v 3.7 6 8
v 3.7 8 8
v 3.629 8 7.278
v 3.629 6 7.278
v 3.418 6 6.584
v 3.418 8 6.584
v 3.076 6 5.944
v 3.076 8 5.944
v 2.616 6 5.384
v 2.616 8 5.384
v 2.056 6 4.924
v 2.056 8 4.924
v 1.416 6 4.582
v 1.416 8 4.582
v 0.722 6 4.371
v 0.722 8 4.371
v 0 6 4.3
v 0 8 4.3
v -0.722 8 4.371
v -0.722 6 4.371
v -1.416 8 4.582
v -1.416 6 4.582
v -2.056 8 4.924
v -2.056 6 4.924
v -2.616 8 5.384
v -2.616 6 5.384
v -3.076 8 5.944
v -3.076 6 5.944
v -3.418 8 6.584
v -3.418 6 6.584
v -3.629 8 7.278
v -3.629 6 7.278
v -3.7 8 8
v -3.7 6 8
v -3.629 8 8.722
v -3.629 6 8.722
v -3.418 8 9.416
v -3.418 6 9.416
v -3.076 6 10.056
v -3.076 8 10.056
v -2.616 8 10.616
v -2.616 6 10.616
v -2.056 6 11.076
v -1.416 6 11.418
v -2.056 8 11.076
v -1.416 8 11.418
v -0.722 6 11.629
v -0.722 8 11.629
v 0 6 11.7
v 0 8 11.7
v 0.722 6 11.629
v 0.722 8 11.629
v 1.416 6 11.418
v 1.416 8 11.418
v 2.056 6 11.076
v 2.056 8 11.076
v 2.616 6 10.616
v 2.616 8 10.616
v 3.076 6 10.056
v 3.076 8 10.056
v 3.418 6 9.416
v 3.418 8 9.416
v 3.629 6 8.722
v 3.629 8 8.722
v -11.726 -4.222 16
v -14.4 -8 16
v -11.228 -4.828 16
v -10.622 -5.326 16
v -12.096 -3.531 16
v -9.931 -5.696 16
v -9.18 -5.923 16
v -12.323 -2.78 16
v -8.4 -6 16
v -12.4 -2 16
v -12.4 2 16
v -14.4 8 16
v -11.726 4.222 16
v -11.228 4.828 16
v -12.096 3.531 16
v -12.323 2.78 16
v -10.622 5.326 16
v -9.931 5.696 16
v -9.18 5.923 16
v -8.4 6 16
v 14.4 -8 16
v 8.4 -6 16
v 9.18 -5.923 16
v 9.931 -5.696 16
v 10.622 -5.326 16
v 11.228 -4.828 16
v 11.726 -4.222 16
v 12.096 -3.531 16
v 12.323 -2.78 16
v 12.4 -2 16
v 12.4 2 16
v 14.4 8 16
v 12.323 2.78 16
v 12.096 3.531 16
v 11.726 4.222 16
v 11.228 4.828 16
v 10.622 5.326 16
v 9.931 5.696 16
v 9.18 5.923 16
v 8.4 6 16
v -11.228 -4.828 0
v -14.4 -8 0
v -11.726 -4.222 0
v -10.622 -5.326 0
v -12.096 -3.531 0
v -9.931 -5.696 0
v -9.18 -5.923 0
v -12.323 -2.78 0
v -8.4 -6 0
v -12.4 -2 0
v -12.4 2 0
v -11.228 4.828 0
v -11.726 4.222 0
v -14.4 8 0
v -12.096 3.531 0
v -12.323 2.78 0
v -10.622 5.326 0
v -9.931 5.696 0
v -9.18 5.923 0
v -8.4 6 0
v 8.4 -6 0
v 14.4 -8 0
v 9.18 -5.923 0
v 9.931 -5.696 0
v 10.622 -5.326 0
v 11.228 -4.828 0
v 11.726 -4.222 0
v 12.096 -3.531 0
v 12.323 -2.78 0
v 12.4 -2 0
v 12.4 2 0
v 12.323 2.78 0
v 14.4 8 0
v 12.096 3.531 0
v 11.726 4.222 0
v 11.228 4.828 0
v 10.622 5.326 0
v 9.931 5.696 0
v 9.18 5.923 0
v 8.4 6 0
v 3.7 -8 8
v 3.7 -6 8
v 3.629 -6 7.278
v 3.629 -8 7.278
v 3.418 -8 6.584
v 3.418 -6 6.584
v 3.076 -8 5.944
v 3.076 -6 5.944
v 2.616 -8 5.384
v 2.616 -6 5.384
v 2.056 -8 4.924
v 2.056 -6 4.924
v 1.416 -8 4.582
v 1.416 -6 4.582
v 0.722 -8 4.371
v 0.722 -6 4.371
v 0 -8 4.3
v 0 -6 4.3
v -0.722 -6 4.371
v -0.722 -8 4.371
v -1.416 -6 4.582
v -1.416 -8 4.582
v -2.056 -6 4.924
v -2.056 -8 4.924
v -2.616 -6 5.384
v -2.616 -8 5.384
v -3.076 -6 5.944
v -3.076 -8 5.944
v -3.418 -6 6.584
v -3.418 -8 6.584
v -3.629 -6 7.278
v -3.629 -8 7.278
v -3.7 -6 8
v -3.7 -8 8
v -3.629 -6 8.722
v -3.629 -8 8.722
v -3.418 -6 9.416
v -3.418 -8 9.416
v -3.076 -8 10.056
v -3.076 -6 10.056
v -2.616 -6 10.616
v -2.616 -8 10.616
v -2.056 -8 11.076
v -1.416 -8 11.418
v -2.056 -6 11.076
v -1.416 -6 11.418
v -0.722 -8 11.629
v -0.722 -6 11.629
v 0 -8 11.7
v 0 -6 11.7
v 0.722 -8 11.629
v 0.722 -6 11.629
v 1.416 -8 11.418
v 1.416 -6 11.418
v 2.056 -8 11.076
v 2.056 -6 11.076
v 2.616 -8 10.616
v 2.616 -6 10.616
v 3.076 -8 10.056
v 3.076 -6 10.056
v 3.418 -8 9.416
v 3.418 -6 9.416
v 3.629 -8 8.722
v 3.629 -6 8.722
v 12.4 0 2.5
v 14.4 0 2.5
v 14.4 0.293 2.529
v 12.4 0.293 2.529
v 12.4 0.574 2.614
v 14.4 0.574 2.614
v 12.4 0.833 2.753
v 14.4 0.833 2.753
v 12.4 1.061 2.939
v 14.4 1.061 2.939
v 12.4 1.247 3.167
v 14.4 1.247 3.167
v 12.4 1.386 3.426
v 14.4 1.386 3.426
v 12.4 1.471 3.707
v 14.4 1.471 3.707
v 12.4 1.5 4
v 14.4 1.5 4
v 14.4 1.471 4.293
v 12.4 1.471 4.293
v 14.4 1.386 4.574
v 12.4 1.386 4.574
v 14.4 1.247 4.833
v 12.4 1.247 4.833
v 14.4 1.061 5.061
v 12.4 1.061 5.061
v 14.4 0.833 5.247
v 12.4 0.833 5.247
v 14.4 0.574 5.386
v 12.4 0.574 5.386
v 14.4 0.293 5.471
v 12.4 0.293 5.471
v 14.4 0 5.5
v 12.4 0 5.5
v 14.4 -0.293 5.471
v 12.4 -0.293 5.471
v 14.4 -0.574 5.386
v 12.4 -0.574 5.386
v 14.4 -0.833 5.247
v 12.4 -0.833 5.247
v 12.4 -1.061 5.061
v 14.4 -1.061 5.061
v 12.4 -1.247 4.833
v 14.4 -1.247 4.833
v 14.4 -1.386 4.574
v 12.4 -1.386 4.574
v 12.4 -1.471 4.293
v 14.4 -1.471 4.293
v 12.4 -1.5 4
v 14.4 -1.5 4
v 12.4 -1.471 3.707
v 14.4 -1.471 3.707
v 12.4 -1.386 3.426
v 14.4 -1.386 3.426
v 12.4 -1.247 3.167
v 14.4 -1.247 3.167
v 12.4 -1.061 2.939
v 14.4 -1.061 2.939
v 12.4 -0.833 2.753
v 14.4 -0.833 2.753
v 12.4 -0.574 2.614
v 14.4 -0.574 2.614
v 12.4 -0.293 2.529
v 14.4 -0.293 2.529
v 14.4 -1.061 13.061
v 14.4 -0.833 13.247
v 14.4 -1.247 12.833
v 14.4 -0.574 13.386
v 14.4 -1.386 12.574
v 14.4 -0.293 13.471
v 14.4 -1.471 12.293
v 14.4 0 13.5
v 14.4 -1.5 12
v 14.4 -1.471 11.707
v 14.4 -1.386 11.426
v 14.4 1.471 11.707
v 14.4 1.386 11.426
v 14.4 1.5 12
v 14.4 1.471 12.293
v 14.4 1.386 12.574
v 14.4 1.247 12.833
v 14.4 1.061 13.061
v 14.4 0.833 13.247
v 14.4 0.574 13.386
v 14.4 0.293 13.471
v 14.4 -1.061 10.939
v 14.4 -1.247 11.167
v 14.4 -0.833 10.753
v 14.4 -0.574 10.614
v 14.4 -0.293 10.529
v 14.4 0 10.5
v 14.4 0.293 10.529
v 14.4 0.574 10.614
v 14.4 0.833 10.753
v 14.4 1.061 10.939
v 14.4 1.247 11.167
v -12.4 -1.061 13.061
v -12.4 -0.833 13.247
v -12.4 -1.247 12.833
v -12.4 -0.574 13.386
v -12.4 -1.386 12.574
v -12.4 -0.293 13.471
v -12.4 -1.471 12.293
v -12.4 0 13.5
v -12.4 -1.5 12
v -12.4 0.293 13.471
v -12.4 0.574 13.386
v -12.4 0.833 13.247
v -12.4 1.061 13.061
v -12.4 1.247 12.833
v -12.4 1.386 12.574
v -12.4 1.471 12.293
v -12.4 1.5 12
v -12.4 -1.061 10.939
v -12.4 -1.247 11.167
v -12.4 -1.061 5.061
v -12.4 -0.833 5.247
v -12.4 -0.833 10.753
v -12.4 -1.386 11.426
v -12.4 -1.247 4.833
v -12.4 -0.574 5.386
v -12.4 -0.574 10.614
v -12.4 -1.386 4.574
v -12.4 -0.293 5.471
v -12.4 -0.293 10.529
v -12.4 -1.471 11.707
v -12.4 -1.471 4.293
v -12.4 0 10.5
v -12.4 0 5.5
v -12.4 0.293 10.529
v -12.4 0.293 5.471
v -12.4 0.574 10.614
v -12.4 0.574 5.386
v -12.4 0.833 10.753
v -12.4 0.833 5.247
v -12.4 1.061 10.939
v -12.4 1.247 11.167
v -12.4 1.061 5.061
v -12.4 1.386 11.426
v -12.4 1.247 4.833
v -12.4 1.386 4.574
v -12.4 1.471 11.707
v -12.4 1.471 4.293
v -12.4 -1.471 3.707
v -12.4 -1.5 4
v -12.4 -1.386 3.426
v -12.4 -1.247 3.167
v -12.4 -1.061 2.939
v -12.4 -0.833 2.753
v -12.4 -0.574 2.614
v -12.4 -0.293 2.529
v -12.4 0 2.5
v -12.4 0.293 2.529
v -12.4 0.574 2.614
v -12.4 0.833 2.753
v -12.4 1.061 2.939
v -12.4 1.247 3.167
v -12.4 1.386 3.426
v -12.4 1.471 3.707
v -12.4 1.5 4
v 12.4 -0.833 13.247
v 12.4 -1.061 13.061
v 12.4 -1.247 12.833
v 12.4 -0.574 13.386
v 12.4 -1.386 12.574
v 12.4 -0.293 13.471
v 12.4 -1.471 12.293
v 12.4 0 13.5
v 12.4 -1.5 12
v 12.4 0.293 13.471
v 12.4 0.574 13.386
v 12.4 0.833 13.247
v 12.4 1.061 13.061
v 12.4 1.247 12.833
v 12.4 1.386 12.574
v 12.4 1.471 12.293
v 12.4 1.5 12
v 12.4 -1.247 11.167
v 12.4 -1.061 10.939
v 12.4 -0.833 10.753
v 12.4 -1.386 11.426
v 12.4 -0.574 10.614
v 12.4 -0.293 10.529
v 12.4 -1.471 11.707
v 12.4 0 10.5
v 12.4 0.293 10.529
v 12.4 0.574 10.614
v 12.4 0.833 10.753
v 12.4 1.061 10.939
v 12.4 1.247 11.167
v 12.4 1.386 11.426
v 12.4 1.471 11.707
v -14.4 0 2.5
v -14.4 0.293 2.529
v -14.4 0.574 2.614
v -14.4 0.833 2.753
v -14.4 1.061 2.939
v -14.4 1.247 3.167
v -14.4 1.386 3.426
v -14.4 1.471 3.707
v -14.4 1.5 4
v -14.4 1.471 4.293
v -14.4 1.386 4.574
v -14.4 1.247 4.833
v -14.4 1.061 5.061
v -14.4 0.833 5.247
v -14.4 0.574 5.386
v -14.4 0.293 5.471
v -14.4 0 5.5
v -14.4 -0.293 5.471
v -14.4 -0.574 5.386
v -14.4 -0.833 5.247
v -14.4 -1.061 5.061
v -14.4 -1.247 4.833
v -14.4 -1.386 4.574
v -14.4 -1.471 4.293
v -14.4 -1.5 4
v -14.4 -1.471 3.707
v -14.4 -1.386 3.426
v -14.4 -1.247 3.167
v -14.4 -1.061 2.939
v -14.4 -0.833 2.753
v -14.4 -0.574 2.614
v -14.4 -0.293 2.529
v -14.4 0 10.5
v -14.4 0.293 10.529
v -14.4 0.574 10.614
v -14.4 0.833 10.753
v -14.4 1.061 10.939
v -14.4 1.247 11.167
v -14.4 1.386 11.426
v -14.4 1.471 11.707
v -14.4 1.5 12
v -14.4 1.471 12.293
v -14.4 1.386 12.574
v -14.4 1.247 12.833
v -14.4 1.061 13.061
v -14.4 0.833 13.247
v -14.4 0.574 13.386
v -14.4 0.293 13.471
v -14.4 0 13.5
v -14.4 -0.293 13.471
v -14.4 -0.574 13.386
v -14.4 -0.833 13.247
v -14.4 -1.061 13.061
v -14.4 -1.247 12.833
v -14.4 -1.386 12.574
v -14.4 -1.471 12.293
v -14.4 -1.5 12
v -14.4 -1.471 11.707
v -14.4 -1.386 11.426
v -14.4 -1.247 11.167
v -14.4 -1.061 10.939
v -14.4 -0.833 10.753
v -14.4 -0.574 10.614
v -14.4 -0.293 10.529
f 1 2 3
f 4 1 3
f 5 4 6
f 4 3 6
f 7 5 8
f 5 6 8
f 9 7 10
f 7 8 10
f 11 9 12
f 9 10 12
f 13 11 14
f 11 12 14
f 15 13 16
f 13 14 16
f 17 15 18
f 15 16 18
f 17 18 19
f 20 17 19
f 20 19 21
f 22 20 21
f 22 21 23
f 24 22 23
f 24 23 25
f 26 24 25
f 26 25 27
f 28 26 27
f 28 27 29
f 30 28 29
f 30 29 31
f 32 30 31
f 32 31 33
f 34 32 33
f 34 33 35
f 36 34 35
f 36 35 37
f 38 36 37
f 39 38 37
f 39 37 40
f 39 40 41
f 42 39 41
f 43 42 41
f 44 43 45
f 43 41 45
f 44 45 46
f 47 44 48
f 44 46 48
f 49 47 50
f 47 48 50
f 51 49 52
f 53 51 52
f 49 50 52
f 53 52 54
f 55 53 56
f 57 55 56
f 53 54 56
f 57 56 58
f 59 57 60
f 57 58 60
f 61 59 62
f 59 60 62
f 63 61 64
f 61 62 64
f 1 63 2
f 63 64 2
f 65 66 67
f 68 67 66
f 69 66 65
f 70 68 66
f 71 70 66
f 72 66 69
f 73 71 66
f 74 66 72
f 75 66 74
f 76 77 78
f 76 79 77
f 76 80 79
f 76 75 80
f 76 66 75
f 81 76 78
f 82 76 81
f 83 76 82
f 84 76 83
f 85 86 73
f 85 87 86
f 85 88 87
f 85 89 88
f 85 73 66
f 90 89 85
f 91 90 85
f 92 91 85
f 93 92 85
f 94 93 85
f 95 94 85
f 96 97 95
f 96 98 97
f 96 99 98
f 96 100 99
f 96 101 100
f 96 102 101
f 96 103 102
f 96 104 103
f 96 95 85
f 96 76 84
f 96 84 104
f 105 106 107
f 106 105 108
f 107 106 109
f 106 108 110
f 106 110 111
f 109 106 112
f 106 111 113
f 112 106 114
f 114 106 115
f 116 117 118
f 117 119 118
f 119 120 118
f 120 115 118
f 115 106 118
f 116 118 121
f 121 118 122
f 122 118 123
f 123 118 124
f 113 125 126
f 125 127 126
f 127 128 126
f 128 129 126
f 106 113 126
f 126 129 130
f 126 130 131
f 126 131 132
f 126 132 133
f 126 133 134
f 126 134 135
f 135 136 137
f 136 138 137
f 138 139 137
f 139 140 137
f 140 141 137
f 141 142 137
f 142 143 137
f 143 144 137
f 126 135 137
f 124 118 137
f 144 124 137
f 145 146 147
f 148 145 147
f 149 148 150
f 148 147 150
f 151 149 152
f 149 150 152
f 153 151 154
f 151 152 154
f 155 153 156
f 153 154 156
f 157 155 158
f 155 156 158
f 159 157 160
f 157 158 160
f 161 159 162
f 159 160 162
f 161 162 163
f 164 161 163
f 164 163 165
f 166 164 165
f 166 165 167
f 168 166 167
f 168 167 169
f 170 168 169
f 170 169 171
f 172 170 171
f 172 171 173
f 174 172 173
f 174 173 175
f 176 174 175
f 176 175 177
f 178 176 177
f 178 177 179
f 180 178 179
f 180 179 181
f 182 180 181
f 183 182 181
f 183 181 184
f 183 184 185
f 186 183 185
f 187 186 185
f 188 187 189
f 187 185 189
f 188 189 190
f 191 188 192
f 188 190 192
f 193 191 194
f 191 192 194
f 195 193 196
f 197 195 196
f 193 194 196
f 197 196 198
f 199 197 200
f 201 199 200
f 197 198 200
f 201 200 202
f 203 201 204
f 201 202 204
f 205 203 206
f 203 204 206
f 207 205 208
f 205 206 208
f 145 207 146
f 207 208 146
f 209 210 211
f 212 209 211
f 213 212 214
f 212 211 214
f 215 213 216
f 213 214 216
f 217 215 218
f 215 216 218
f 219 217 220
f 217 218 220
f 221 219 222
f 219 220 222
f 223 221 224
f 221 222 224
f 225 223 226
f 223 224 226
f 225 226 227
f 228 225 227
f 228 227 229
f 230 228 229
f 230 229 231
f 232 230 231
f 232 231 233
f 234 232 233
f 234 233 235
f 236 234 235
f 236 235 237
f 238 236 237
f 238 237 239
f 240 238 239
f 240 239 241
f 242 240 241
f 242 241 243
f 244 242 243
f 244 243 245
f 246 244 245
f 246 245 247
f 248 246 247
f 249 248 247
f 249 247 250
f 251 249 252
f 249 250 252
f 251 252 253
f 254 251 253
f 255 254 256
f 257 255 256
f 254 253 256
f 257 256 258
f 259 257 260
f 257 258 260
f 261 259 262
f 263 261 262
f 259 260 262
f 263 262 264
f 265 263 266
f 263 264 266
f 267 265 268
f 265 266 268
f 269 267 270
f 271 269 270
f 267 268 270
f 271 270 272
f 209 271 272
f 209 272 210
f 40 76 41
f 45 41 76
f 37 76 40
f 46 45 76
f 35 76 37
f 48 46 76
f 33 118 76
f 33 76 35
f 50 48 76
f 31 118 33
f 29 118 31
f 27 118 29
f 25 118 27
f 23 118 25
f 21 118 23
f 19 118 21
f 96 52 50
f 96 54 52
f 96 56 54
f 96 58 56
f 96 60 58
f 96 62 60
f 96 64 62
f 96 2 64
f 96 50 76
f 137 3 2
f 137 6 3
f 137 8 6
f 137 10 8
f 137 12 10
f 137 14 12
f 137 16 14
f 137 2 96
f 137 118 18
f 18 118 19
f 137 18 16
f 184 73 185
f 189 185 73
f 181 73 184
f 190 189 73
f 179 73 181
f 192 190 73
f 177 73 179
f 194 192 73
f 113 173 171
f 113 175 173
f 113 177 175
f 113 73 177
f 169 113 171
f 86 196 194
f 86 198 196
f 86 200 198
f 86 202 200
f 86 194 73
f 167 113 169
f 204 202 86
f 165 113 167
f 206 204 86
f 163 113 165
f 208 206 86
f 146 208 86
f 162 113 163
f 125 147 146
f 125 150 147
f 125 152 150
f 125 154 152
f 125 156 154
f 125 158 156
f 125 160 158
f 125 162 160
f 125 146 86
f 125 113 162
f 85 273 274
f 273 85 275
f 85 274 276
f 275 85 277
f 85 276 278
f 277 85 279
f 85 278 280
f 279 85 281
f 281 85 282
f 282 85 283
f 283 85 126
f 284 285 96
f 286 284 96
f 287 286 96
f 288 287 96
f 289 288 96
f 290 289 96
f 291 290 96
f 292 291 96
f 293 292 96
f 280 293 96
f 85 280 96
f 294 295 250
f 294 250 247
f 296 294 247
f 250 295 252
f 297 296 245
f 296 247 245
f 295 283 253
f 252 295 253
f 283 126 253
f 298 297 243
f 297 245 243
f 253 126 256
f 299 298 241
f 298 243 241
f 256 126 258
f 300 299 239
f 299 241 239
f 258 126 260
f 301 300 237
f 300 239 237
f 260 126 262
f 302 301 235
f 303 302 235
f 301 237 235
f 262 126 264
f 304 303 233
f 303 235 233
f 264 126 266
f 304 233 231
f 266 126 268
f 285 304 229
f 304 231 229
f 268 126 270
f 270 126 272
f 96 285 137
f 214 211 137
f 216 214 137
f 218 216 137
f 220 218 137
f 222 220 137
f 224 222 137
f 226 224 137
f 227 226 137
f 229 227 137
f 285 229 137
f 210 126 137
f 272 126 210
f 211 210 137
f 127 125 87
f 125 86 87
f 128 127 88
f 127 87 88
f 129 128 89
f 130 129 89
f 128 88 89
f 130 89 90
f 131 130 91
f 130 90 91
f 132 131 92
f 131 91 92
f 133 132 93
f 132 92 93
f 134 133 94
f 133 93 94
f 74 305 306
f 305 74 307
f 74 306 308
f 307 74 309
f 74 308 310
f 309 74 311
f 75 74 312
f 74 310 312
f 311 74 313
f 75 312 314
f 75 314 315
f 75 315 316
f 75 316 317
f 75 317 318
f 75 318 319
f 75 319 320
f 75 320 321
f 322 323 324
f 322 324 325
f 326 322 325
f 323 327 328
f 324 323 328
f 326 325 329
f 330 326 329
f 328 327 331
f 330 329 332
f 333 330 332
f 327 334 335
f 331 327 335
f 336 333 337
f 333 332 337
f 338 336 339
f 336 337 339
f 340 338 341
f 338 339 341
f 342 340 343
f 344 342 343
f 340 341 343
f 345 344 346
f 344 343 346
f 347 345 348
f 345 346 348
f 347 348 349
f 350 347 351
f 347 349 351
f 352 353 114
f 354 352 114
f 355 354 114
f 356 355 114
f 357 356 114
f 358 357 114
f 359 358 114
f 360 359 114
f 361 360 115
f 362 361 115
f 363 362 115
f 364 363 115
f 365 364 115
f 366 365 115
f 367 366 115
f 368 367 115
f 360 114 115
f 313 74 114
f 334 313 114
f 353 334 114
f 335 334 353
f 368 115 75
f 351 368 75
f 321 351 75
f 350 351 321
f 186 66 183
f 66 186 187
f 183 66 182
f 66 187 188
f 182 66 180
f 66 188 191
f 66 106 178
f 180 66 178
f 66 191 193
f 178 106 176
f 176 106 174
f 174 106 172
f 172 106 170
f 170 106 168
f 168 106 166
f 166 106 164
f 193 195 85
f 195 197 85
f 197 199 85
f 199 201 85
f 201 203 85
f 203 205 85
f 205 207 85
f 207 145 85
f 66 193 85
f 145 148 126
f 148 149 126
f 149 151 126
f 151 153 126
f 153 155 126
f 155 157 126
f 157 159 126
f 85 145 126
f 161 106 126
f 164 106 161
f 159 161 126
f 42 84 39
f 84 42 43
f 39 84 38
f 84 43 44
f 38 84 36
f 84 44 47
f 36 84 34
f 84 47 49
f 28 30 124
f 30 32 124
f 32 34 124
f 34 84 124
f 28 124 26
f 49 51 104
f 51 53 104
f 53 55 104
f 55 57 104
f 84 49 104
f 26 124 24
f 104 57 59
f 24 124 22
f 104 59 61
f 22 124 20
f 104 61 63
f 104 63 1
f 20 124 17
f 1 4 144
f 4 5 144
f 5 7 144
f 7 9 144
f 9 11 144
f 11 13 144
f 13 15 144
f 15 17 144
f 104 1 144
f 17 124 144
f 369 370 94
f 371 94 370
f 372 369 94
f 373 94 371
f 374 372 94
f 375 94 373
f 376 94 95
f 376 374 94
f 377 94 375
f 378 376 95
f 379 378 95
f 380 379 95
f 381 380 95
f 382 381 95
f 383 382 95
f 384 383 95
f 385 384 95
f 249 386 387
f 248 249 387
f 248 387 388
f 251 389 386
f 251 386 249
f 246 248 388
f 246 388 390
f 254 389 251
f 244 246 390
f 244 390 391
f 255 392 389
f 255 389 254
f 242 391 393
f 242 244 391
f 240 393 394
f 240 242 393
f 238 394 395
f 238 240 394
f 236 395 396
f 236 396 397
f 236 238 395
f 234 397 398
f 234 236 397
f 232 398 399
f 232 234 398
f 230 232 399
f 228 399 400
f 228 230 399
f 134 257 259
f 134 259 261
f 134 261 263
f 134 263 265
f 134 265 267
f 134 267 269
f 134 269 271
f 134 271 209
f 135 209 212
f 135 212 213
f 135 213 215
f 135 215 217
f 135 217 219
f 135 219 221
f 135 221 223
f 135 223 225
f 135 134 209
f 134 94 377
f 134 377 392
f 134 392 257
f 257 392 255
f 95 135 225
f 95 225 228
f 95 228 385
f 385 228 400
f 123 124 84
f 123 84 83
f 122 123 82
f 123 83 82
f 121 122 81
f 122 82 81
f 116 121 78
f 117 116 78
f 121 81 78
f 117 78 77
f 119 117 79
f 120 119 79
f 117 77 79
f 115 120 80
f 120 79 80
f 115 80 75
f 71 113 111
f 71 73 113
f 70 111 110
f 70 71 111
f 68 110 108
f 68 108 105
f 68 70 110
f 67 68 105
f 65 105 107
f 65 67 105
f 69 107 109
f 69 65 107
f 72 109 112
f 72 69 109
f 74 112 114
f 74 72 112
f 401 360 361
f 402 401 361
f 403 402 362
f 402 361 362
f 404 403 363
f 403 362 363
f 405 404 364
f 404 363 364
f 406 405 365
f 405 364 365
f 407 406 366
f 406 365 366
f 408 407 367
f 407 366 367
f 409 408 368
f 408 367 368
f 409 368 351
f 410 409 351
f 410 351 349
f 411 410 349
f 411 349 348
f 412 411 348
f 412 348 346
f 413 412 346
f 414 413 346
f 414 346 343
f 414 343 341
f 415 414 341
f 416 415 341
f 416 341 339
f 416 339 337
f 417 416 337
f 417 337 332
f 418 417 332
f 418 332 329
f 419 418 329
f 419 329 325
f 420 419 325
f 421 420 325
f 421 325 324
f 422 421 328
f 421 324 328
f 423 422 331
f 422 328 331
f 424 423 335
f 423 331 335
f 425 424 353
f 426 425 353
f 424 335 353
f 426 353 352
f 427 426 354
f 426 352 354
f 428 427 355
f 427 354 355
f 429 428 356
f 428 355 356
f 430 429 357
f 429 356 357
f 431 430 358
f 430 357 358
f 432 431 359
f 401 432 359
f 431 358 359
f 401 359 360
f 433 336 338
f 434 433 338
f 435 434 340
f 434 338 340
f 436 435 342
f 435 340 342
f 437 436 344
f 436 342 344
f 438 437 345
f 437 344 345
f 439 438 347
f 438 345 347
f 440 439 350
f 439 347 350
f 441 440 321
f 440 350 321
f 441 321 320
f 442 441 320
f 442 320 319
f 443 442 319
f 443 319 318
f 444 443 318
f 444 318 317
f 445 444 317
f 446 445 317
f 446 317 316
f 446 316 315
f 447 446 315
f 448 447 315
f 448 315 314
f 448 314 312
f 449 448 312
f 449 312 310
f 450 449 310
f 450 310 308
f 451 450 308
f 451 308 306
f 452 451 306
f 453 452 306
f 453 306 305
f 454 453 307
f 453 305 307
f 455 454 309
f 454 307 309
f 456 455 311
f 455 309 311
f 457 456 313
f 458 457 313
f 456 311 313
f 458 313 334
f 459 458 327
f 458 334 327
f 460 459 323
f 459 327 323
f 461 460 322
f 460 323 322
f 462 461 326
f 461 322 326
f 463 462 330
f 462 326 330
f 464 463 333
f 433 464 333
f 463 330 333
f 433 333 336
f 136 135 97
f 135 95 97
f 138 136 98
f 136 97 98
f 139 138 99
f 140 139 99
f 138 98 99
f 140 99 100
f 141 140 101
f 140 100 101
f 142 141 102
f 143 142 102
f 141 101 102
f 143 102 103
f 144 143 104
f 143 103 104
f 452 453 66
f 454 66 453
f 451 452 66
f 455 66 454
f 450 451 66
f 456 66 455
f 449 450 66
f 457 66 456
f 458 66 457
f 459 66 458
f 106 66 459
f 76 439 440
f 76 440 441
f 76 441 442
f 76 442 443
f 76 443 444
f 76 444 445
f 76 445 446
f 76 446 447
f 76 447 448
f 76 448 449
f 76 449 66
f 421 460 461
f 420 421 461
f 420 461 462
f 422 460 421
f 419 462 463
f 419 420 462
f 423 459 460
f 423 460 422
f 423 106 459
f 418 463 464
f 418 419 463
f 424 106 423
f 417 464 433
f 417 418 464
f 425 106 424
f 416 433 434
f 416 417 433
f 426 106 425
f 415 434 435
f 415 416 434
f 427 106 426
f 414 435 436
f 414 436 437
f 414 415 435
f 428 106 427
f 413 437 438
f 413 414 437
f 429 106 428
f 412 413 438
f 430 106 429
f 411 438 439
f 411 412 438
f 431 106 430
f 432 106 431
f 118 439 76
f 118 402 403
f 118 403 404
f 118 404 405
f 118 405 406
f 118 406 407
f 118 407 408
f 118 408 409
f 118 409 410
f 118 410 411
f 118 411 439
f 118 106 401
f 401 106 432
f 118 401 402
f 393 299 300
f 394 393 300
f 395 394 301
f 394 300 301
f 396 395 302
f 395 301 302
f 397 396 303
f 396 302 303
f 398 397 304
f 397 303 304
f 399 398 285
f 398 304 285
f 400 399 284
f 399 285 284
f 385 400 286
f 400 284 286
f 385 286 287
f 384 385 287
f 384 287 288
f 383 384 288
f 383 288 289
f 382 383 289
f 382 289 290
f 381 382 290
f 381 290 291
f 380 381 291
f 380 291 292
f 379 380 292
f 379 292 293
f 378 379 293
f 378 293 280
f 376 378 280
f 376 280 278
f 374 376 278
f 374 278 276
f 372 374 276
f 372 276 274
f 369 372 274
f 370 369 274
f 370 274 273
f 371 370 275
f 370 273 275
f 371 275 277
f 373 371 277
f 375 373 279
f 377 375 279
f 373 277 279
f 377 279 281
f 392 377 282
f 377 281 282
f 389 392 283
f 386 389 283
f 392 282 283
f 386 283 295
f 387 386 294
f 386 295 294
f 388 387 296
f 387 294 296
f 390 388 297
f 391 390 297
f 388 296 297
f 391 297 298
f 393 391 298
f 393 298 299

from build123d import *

# Parameters (mm, degrees)
SKETCH_1_W          = 28.8
SKETCH_1_H          = 16
SKETCH_1_W_2        = 24.8
SKETCH_1_H_2        = 12
EXTRUDE_1_DEPTH     = 16
SKETCH_2_R          = 1.5
CUT_EXTRUDE_1_DEPTH = 28.8
SKETCH_3_R          = 3.7
CUT_EXTRUDE_2_DEPTH = 16
FILLET_1_R          = 4


with BuildPart() as part:
    # 草图1 → 凸台-拉伸1 (new body)
    with BuildSketch(Plane.XY):
        Rectangle(SKETCH_1_W, SKETCH_1_H)
        Rectangle(SKETCH_1_W_2, SKETCH_1_H_2, mode=Mode.SUBTRACT)
    extrude(amount=EXTRUDE_1_DEPTH)

    # 草图2 → 切除-拉伸1 (cut)
    with BuildSketch(Plane(origin=(14.4, 0, 0), x_dir=(0, 0, -1), z_dir=(1, 0, 0))):
        with Locations((-12, 0)):
            Circle(SKETCH_2_R)
        with Locations((-4, 0)):
            Circle(SKETCH_2_R)
    extrude(amount=-CUT_EXTRUDE_1_DEPTH, mode=Mode.SUBTRACT)

    # 草图3 → 切除-拉伸2 (cut)
    with BuildSketch(Plane(origin=(0, 8, 0), x_dir=(1, 0, 0), z_dir=(0, 1, 0))):
        with Locations((0, -8)):
            Circle(SKETCH_3_R)
    extrude(amount=-CUT_EXTRUDE_2_DEPTH, mode=Mode.SUBTRACT)

    # 圆角1
    fillet_1_edges = [part.edges().sort_by_distance(p)[0] for p in [
        (12.4, -6, 8),
        (12.4, 6, 8),
        (-12.4, 6, 8),
        (-12.4, -6, 8),
    ]]
    fillet(fillet_1_edges, radius=FILLET_1_R)


solid = part.part
